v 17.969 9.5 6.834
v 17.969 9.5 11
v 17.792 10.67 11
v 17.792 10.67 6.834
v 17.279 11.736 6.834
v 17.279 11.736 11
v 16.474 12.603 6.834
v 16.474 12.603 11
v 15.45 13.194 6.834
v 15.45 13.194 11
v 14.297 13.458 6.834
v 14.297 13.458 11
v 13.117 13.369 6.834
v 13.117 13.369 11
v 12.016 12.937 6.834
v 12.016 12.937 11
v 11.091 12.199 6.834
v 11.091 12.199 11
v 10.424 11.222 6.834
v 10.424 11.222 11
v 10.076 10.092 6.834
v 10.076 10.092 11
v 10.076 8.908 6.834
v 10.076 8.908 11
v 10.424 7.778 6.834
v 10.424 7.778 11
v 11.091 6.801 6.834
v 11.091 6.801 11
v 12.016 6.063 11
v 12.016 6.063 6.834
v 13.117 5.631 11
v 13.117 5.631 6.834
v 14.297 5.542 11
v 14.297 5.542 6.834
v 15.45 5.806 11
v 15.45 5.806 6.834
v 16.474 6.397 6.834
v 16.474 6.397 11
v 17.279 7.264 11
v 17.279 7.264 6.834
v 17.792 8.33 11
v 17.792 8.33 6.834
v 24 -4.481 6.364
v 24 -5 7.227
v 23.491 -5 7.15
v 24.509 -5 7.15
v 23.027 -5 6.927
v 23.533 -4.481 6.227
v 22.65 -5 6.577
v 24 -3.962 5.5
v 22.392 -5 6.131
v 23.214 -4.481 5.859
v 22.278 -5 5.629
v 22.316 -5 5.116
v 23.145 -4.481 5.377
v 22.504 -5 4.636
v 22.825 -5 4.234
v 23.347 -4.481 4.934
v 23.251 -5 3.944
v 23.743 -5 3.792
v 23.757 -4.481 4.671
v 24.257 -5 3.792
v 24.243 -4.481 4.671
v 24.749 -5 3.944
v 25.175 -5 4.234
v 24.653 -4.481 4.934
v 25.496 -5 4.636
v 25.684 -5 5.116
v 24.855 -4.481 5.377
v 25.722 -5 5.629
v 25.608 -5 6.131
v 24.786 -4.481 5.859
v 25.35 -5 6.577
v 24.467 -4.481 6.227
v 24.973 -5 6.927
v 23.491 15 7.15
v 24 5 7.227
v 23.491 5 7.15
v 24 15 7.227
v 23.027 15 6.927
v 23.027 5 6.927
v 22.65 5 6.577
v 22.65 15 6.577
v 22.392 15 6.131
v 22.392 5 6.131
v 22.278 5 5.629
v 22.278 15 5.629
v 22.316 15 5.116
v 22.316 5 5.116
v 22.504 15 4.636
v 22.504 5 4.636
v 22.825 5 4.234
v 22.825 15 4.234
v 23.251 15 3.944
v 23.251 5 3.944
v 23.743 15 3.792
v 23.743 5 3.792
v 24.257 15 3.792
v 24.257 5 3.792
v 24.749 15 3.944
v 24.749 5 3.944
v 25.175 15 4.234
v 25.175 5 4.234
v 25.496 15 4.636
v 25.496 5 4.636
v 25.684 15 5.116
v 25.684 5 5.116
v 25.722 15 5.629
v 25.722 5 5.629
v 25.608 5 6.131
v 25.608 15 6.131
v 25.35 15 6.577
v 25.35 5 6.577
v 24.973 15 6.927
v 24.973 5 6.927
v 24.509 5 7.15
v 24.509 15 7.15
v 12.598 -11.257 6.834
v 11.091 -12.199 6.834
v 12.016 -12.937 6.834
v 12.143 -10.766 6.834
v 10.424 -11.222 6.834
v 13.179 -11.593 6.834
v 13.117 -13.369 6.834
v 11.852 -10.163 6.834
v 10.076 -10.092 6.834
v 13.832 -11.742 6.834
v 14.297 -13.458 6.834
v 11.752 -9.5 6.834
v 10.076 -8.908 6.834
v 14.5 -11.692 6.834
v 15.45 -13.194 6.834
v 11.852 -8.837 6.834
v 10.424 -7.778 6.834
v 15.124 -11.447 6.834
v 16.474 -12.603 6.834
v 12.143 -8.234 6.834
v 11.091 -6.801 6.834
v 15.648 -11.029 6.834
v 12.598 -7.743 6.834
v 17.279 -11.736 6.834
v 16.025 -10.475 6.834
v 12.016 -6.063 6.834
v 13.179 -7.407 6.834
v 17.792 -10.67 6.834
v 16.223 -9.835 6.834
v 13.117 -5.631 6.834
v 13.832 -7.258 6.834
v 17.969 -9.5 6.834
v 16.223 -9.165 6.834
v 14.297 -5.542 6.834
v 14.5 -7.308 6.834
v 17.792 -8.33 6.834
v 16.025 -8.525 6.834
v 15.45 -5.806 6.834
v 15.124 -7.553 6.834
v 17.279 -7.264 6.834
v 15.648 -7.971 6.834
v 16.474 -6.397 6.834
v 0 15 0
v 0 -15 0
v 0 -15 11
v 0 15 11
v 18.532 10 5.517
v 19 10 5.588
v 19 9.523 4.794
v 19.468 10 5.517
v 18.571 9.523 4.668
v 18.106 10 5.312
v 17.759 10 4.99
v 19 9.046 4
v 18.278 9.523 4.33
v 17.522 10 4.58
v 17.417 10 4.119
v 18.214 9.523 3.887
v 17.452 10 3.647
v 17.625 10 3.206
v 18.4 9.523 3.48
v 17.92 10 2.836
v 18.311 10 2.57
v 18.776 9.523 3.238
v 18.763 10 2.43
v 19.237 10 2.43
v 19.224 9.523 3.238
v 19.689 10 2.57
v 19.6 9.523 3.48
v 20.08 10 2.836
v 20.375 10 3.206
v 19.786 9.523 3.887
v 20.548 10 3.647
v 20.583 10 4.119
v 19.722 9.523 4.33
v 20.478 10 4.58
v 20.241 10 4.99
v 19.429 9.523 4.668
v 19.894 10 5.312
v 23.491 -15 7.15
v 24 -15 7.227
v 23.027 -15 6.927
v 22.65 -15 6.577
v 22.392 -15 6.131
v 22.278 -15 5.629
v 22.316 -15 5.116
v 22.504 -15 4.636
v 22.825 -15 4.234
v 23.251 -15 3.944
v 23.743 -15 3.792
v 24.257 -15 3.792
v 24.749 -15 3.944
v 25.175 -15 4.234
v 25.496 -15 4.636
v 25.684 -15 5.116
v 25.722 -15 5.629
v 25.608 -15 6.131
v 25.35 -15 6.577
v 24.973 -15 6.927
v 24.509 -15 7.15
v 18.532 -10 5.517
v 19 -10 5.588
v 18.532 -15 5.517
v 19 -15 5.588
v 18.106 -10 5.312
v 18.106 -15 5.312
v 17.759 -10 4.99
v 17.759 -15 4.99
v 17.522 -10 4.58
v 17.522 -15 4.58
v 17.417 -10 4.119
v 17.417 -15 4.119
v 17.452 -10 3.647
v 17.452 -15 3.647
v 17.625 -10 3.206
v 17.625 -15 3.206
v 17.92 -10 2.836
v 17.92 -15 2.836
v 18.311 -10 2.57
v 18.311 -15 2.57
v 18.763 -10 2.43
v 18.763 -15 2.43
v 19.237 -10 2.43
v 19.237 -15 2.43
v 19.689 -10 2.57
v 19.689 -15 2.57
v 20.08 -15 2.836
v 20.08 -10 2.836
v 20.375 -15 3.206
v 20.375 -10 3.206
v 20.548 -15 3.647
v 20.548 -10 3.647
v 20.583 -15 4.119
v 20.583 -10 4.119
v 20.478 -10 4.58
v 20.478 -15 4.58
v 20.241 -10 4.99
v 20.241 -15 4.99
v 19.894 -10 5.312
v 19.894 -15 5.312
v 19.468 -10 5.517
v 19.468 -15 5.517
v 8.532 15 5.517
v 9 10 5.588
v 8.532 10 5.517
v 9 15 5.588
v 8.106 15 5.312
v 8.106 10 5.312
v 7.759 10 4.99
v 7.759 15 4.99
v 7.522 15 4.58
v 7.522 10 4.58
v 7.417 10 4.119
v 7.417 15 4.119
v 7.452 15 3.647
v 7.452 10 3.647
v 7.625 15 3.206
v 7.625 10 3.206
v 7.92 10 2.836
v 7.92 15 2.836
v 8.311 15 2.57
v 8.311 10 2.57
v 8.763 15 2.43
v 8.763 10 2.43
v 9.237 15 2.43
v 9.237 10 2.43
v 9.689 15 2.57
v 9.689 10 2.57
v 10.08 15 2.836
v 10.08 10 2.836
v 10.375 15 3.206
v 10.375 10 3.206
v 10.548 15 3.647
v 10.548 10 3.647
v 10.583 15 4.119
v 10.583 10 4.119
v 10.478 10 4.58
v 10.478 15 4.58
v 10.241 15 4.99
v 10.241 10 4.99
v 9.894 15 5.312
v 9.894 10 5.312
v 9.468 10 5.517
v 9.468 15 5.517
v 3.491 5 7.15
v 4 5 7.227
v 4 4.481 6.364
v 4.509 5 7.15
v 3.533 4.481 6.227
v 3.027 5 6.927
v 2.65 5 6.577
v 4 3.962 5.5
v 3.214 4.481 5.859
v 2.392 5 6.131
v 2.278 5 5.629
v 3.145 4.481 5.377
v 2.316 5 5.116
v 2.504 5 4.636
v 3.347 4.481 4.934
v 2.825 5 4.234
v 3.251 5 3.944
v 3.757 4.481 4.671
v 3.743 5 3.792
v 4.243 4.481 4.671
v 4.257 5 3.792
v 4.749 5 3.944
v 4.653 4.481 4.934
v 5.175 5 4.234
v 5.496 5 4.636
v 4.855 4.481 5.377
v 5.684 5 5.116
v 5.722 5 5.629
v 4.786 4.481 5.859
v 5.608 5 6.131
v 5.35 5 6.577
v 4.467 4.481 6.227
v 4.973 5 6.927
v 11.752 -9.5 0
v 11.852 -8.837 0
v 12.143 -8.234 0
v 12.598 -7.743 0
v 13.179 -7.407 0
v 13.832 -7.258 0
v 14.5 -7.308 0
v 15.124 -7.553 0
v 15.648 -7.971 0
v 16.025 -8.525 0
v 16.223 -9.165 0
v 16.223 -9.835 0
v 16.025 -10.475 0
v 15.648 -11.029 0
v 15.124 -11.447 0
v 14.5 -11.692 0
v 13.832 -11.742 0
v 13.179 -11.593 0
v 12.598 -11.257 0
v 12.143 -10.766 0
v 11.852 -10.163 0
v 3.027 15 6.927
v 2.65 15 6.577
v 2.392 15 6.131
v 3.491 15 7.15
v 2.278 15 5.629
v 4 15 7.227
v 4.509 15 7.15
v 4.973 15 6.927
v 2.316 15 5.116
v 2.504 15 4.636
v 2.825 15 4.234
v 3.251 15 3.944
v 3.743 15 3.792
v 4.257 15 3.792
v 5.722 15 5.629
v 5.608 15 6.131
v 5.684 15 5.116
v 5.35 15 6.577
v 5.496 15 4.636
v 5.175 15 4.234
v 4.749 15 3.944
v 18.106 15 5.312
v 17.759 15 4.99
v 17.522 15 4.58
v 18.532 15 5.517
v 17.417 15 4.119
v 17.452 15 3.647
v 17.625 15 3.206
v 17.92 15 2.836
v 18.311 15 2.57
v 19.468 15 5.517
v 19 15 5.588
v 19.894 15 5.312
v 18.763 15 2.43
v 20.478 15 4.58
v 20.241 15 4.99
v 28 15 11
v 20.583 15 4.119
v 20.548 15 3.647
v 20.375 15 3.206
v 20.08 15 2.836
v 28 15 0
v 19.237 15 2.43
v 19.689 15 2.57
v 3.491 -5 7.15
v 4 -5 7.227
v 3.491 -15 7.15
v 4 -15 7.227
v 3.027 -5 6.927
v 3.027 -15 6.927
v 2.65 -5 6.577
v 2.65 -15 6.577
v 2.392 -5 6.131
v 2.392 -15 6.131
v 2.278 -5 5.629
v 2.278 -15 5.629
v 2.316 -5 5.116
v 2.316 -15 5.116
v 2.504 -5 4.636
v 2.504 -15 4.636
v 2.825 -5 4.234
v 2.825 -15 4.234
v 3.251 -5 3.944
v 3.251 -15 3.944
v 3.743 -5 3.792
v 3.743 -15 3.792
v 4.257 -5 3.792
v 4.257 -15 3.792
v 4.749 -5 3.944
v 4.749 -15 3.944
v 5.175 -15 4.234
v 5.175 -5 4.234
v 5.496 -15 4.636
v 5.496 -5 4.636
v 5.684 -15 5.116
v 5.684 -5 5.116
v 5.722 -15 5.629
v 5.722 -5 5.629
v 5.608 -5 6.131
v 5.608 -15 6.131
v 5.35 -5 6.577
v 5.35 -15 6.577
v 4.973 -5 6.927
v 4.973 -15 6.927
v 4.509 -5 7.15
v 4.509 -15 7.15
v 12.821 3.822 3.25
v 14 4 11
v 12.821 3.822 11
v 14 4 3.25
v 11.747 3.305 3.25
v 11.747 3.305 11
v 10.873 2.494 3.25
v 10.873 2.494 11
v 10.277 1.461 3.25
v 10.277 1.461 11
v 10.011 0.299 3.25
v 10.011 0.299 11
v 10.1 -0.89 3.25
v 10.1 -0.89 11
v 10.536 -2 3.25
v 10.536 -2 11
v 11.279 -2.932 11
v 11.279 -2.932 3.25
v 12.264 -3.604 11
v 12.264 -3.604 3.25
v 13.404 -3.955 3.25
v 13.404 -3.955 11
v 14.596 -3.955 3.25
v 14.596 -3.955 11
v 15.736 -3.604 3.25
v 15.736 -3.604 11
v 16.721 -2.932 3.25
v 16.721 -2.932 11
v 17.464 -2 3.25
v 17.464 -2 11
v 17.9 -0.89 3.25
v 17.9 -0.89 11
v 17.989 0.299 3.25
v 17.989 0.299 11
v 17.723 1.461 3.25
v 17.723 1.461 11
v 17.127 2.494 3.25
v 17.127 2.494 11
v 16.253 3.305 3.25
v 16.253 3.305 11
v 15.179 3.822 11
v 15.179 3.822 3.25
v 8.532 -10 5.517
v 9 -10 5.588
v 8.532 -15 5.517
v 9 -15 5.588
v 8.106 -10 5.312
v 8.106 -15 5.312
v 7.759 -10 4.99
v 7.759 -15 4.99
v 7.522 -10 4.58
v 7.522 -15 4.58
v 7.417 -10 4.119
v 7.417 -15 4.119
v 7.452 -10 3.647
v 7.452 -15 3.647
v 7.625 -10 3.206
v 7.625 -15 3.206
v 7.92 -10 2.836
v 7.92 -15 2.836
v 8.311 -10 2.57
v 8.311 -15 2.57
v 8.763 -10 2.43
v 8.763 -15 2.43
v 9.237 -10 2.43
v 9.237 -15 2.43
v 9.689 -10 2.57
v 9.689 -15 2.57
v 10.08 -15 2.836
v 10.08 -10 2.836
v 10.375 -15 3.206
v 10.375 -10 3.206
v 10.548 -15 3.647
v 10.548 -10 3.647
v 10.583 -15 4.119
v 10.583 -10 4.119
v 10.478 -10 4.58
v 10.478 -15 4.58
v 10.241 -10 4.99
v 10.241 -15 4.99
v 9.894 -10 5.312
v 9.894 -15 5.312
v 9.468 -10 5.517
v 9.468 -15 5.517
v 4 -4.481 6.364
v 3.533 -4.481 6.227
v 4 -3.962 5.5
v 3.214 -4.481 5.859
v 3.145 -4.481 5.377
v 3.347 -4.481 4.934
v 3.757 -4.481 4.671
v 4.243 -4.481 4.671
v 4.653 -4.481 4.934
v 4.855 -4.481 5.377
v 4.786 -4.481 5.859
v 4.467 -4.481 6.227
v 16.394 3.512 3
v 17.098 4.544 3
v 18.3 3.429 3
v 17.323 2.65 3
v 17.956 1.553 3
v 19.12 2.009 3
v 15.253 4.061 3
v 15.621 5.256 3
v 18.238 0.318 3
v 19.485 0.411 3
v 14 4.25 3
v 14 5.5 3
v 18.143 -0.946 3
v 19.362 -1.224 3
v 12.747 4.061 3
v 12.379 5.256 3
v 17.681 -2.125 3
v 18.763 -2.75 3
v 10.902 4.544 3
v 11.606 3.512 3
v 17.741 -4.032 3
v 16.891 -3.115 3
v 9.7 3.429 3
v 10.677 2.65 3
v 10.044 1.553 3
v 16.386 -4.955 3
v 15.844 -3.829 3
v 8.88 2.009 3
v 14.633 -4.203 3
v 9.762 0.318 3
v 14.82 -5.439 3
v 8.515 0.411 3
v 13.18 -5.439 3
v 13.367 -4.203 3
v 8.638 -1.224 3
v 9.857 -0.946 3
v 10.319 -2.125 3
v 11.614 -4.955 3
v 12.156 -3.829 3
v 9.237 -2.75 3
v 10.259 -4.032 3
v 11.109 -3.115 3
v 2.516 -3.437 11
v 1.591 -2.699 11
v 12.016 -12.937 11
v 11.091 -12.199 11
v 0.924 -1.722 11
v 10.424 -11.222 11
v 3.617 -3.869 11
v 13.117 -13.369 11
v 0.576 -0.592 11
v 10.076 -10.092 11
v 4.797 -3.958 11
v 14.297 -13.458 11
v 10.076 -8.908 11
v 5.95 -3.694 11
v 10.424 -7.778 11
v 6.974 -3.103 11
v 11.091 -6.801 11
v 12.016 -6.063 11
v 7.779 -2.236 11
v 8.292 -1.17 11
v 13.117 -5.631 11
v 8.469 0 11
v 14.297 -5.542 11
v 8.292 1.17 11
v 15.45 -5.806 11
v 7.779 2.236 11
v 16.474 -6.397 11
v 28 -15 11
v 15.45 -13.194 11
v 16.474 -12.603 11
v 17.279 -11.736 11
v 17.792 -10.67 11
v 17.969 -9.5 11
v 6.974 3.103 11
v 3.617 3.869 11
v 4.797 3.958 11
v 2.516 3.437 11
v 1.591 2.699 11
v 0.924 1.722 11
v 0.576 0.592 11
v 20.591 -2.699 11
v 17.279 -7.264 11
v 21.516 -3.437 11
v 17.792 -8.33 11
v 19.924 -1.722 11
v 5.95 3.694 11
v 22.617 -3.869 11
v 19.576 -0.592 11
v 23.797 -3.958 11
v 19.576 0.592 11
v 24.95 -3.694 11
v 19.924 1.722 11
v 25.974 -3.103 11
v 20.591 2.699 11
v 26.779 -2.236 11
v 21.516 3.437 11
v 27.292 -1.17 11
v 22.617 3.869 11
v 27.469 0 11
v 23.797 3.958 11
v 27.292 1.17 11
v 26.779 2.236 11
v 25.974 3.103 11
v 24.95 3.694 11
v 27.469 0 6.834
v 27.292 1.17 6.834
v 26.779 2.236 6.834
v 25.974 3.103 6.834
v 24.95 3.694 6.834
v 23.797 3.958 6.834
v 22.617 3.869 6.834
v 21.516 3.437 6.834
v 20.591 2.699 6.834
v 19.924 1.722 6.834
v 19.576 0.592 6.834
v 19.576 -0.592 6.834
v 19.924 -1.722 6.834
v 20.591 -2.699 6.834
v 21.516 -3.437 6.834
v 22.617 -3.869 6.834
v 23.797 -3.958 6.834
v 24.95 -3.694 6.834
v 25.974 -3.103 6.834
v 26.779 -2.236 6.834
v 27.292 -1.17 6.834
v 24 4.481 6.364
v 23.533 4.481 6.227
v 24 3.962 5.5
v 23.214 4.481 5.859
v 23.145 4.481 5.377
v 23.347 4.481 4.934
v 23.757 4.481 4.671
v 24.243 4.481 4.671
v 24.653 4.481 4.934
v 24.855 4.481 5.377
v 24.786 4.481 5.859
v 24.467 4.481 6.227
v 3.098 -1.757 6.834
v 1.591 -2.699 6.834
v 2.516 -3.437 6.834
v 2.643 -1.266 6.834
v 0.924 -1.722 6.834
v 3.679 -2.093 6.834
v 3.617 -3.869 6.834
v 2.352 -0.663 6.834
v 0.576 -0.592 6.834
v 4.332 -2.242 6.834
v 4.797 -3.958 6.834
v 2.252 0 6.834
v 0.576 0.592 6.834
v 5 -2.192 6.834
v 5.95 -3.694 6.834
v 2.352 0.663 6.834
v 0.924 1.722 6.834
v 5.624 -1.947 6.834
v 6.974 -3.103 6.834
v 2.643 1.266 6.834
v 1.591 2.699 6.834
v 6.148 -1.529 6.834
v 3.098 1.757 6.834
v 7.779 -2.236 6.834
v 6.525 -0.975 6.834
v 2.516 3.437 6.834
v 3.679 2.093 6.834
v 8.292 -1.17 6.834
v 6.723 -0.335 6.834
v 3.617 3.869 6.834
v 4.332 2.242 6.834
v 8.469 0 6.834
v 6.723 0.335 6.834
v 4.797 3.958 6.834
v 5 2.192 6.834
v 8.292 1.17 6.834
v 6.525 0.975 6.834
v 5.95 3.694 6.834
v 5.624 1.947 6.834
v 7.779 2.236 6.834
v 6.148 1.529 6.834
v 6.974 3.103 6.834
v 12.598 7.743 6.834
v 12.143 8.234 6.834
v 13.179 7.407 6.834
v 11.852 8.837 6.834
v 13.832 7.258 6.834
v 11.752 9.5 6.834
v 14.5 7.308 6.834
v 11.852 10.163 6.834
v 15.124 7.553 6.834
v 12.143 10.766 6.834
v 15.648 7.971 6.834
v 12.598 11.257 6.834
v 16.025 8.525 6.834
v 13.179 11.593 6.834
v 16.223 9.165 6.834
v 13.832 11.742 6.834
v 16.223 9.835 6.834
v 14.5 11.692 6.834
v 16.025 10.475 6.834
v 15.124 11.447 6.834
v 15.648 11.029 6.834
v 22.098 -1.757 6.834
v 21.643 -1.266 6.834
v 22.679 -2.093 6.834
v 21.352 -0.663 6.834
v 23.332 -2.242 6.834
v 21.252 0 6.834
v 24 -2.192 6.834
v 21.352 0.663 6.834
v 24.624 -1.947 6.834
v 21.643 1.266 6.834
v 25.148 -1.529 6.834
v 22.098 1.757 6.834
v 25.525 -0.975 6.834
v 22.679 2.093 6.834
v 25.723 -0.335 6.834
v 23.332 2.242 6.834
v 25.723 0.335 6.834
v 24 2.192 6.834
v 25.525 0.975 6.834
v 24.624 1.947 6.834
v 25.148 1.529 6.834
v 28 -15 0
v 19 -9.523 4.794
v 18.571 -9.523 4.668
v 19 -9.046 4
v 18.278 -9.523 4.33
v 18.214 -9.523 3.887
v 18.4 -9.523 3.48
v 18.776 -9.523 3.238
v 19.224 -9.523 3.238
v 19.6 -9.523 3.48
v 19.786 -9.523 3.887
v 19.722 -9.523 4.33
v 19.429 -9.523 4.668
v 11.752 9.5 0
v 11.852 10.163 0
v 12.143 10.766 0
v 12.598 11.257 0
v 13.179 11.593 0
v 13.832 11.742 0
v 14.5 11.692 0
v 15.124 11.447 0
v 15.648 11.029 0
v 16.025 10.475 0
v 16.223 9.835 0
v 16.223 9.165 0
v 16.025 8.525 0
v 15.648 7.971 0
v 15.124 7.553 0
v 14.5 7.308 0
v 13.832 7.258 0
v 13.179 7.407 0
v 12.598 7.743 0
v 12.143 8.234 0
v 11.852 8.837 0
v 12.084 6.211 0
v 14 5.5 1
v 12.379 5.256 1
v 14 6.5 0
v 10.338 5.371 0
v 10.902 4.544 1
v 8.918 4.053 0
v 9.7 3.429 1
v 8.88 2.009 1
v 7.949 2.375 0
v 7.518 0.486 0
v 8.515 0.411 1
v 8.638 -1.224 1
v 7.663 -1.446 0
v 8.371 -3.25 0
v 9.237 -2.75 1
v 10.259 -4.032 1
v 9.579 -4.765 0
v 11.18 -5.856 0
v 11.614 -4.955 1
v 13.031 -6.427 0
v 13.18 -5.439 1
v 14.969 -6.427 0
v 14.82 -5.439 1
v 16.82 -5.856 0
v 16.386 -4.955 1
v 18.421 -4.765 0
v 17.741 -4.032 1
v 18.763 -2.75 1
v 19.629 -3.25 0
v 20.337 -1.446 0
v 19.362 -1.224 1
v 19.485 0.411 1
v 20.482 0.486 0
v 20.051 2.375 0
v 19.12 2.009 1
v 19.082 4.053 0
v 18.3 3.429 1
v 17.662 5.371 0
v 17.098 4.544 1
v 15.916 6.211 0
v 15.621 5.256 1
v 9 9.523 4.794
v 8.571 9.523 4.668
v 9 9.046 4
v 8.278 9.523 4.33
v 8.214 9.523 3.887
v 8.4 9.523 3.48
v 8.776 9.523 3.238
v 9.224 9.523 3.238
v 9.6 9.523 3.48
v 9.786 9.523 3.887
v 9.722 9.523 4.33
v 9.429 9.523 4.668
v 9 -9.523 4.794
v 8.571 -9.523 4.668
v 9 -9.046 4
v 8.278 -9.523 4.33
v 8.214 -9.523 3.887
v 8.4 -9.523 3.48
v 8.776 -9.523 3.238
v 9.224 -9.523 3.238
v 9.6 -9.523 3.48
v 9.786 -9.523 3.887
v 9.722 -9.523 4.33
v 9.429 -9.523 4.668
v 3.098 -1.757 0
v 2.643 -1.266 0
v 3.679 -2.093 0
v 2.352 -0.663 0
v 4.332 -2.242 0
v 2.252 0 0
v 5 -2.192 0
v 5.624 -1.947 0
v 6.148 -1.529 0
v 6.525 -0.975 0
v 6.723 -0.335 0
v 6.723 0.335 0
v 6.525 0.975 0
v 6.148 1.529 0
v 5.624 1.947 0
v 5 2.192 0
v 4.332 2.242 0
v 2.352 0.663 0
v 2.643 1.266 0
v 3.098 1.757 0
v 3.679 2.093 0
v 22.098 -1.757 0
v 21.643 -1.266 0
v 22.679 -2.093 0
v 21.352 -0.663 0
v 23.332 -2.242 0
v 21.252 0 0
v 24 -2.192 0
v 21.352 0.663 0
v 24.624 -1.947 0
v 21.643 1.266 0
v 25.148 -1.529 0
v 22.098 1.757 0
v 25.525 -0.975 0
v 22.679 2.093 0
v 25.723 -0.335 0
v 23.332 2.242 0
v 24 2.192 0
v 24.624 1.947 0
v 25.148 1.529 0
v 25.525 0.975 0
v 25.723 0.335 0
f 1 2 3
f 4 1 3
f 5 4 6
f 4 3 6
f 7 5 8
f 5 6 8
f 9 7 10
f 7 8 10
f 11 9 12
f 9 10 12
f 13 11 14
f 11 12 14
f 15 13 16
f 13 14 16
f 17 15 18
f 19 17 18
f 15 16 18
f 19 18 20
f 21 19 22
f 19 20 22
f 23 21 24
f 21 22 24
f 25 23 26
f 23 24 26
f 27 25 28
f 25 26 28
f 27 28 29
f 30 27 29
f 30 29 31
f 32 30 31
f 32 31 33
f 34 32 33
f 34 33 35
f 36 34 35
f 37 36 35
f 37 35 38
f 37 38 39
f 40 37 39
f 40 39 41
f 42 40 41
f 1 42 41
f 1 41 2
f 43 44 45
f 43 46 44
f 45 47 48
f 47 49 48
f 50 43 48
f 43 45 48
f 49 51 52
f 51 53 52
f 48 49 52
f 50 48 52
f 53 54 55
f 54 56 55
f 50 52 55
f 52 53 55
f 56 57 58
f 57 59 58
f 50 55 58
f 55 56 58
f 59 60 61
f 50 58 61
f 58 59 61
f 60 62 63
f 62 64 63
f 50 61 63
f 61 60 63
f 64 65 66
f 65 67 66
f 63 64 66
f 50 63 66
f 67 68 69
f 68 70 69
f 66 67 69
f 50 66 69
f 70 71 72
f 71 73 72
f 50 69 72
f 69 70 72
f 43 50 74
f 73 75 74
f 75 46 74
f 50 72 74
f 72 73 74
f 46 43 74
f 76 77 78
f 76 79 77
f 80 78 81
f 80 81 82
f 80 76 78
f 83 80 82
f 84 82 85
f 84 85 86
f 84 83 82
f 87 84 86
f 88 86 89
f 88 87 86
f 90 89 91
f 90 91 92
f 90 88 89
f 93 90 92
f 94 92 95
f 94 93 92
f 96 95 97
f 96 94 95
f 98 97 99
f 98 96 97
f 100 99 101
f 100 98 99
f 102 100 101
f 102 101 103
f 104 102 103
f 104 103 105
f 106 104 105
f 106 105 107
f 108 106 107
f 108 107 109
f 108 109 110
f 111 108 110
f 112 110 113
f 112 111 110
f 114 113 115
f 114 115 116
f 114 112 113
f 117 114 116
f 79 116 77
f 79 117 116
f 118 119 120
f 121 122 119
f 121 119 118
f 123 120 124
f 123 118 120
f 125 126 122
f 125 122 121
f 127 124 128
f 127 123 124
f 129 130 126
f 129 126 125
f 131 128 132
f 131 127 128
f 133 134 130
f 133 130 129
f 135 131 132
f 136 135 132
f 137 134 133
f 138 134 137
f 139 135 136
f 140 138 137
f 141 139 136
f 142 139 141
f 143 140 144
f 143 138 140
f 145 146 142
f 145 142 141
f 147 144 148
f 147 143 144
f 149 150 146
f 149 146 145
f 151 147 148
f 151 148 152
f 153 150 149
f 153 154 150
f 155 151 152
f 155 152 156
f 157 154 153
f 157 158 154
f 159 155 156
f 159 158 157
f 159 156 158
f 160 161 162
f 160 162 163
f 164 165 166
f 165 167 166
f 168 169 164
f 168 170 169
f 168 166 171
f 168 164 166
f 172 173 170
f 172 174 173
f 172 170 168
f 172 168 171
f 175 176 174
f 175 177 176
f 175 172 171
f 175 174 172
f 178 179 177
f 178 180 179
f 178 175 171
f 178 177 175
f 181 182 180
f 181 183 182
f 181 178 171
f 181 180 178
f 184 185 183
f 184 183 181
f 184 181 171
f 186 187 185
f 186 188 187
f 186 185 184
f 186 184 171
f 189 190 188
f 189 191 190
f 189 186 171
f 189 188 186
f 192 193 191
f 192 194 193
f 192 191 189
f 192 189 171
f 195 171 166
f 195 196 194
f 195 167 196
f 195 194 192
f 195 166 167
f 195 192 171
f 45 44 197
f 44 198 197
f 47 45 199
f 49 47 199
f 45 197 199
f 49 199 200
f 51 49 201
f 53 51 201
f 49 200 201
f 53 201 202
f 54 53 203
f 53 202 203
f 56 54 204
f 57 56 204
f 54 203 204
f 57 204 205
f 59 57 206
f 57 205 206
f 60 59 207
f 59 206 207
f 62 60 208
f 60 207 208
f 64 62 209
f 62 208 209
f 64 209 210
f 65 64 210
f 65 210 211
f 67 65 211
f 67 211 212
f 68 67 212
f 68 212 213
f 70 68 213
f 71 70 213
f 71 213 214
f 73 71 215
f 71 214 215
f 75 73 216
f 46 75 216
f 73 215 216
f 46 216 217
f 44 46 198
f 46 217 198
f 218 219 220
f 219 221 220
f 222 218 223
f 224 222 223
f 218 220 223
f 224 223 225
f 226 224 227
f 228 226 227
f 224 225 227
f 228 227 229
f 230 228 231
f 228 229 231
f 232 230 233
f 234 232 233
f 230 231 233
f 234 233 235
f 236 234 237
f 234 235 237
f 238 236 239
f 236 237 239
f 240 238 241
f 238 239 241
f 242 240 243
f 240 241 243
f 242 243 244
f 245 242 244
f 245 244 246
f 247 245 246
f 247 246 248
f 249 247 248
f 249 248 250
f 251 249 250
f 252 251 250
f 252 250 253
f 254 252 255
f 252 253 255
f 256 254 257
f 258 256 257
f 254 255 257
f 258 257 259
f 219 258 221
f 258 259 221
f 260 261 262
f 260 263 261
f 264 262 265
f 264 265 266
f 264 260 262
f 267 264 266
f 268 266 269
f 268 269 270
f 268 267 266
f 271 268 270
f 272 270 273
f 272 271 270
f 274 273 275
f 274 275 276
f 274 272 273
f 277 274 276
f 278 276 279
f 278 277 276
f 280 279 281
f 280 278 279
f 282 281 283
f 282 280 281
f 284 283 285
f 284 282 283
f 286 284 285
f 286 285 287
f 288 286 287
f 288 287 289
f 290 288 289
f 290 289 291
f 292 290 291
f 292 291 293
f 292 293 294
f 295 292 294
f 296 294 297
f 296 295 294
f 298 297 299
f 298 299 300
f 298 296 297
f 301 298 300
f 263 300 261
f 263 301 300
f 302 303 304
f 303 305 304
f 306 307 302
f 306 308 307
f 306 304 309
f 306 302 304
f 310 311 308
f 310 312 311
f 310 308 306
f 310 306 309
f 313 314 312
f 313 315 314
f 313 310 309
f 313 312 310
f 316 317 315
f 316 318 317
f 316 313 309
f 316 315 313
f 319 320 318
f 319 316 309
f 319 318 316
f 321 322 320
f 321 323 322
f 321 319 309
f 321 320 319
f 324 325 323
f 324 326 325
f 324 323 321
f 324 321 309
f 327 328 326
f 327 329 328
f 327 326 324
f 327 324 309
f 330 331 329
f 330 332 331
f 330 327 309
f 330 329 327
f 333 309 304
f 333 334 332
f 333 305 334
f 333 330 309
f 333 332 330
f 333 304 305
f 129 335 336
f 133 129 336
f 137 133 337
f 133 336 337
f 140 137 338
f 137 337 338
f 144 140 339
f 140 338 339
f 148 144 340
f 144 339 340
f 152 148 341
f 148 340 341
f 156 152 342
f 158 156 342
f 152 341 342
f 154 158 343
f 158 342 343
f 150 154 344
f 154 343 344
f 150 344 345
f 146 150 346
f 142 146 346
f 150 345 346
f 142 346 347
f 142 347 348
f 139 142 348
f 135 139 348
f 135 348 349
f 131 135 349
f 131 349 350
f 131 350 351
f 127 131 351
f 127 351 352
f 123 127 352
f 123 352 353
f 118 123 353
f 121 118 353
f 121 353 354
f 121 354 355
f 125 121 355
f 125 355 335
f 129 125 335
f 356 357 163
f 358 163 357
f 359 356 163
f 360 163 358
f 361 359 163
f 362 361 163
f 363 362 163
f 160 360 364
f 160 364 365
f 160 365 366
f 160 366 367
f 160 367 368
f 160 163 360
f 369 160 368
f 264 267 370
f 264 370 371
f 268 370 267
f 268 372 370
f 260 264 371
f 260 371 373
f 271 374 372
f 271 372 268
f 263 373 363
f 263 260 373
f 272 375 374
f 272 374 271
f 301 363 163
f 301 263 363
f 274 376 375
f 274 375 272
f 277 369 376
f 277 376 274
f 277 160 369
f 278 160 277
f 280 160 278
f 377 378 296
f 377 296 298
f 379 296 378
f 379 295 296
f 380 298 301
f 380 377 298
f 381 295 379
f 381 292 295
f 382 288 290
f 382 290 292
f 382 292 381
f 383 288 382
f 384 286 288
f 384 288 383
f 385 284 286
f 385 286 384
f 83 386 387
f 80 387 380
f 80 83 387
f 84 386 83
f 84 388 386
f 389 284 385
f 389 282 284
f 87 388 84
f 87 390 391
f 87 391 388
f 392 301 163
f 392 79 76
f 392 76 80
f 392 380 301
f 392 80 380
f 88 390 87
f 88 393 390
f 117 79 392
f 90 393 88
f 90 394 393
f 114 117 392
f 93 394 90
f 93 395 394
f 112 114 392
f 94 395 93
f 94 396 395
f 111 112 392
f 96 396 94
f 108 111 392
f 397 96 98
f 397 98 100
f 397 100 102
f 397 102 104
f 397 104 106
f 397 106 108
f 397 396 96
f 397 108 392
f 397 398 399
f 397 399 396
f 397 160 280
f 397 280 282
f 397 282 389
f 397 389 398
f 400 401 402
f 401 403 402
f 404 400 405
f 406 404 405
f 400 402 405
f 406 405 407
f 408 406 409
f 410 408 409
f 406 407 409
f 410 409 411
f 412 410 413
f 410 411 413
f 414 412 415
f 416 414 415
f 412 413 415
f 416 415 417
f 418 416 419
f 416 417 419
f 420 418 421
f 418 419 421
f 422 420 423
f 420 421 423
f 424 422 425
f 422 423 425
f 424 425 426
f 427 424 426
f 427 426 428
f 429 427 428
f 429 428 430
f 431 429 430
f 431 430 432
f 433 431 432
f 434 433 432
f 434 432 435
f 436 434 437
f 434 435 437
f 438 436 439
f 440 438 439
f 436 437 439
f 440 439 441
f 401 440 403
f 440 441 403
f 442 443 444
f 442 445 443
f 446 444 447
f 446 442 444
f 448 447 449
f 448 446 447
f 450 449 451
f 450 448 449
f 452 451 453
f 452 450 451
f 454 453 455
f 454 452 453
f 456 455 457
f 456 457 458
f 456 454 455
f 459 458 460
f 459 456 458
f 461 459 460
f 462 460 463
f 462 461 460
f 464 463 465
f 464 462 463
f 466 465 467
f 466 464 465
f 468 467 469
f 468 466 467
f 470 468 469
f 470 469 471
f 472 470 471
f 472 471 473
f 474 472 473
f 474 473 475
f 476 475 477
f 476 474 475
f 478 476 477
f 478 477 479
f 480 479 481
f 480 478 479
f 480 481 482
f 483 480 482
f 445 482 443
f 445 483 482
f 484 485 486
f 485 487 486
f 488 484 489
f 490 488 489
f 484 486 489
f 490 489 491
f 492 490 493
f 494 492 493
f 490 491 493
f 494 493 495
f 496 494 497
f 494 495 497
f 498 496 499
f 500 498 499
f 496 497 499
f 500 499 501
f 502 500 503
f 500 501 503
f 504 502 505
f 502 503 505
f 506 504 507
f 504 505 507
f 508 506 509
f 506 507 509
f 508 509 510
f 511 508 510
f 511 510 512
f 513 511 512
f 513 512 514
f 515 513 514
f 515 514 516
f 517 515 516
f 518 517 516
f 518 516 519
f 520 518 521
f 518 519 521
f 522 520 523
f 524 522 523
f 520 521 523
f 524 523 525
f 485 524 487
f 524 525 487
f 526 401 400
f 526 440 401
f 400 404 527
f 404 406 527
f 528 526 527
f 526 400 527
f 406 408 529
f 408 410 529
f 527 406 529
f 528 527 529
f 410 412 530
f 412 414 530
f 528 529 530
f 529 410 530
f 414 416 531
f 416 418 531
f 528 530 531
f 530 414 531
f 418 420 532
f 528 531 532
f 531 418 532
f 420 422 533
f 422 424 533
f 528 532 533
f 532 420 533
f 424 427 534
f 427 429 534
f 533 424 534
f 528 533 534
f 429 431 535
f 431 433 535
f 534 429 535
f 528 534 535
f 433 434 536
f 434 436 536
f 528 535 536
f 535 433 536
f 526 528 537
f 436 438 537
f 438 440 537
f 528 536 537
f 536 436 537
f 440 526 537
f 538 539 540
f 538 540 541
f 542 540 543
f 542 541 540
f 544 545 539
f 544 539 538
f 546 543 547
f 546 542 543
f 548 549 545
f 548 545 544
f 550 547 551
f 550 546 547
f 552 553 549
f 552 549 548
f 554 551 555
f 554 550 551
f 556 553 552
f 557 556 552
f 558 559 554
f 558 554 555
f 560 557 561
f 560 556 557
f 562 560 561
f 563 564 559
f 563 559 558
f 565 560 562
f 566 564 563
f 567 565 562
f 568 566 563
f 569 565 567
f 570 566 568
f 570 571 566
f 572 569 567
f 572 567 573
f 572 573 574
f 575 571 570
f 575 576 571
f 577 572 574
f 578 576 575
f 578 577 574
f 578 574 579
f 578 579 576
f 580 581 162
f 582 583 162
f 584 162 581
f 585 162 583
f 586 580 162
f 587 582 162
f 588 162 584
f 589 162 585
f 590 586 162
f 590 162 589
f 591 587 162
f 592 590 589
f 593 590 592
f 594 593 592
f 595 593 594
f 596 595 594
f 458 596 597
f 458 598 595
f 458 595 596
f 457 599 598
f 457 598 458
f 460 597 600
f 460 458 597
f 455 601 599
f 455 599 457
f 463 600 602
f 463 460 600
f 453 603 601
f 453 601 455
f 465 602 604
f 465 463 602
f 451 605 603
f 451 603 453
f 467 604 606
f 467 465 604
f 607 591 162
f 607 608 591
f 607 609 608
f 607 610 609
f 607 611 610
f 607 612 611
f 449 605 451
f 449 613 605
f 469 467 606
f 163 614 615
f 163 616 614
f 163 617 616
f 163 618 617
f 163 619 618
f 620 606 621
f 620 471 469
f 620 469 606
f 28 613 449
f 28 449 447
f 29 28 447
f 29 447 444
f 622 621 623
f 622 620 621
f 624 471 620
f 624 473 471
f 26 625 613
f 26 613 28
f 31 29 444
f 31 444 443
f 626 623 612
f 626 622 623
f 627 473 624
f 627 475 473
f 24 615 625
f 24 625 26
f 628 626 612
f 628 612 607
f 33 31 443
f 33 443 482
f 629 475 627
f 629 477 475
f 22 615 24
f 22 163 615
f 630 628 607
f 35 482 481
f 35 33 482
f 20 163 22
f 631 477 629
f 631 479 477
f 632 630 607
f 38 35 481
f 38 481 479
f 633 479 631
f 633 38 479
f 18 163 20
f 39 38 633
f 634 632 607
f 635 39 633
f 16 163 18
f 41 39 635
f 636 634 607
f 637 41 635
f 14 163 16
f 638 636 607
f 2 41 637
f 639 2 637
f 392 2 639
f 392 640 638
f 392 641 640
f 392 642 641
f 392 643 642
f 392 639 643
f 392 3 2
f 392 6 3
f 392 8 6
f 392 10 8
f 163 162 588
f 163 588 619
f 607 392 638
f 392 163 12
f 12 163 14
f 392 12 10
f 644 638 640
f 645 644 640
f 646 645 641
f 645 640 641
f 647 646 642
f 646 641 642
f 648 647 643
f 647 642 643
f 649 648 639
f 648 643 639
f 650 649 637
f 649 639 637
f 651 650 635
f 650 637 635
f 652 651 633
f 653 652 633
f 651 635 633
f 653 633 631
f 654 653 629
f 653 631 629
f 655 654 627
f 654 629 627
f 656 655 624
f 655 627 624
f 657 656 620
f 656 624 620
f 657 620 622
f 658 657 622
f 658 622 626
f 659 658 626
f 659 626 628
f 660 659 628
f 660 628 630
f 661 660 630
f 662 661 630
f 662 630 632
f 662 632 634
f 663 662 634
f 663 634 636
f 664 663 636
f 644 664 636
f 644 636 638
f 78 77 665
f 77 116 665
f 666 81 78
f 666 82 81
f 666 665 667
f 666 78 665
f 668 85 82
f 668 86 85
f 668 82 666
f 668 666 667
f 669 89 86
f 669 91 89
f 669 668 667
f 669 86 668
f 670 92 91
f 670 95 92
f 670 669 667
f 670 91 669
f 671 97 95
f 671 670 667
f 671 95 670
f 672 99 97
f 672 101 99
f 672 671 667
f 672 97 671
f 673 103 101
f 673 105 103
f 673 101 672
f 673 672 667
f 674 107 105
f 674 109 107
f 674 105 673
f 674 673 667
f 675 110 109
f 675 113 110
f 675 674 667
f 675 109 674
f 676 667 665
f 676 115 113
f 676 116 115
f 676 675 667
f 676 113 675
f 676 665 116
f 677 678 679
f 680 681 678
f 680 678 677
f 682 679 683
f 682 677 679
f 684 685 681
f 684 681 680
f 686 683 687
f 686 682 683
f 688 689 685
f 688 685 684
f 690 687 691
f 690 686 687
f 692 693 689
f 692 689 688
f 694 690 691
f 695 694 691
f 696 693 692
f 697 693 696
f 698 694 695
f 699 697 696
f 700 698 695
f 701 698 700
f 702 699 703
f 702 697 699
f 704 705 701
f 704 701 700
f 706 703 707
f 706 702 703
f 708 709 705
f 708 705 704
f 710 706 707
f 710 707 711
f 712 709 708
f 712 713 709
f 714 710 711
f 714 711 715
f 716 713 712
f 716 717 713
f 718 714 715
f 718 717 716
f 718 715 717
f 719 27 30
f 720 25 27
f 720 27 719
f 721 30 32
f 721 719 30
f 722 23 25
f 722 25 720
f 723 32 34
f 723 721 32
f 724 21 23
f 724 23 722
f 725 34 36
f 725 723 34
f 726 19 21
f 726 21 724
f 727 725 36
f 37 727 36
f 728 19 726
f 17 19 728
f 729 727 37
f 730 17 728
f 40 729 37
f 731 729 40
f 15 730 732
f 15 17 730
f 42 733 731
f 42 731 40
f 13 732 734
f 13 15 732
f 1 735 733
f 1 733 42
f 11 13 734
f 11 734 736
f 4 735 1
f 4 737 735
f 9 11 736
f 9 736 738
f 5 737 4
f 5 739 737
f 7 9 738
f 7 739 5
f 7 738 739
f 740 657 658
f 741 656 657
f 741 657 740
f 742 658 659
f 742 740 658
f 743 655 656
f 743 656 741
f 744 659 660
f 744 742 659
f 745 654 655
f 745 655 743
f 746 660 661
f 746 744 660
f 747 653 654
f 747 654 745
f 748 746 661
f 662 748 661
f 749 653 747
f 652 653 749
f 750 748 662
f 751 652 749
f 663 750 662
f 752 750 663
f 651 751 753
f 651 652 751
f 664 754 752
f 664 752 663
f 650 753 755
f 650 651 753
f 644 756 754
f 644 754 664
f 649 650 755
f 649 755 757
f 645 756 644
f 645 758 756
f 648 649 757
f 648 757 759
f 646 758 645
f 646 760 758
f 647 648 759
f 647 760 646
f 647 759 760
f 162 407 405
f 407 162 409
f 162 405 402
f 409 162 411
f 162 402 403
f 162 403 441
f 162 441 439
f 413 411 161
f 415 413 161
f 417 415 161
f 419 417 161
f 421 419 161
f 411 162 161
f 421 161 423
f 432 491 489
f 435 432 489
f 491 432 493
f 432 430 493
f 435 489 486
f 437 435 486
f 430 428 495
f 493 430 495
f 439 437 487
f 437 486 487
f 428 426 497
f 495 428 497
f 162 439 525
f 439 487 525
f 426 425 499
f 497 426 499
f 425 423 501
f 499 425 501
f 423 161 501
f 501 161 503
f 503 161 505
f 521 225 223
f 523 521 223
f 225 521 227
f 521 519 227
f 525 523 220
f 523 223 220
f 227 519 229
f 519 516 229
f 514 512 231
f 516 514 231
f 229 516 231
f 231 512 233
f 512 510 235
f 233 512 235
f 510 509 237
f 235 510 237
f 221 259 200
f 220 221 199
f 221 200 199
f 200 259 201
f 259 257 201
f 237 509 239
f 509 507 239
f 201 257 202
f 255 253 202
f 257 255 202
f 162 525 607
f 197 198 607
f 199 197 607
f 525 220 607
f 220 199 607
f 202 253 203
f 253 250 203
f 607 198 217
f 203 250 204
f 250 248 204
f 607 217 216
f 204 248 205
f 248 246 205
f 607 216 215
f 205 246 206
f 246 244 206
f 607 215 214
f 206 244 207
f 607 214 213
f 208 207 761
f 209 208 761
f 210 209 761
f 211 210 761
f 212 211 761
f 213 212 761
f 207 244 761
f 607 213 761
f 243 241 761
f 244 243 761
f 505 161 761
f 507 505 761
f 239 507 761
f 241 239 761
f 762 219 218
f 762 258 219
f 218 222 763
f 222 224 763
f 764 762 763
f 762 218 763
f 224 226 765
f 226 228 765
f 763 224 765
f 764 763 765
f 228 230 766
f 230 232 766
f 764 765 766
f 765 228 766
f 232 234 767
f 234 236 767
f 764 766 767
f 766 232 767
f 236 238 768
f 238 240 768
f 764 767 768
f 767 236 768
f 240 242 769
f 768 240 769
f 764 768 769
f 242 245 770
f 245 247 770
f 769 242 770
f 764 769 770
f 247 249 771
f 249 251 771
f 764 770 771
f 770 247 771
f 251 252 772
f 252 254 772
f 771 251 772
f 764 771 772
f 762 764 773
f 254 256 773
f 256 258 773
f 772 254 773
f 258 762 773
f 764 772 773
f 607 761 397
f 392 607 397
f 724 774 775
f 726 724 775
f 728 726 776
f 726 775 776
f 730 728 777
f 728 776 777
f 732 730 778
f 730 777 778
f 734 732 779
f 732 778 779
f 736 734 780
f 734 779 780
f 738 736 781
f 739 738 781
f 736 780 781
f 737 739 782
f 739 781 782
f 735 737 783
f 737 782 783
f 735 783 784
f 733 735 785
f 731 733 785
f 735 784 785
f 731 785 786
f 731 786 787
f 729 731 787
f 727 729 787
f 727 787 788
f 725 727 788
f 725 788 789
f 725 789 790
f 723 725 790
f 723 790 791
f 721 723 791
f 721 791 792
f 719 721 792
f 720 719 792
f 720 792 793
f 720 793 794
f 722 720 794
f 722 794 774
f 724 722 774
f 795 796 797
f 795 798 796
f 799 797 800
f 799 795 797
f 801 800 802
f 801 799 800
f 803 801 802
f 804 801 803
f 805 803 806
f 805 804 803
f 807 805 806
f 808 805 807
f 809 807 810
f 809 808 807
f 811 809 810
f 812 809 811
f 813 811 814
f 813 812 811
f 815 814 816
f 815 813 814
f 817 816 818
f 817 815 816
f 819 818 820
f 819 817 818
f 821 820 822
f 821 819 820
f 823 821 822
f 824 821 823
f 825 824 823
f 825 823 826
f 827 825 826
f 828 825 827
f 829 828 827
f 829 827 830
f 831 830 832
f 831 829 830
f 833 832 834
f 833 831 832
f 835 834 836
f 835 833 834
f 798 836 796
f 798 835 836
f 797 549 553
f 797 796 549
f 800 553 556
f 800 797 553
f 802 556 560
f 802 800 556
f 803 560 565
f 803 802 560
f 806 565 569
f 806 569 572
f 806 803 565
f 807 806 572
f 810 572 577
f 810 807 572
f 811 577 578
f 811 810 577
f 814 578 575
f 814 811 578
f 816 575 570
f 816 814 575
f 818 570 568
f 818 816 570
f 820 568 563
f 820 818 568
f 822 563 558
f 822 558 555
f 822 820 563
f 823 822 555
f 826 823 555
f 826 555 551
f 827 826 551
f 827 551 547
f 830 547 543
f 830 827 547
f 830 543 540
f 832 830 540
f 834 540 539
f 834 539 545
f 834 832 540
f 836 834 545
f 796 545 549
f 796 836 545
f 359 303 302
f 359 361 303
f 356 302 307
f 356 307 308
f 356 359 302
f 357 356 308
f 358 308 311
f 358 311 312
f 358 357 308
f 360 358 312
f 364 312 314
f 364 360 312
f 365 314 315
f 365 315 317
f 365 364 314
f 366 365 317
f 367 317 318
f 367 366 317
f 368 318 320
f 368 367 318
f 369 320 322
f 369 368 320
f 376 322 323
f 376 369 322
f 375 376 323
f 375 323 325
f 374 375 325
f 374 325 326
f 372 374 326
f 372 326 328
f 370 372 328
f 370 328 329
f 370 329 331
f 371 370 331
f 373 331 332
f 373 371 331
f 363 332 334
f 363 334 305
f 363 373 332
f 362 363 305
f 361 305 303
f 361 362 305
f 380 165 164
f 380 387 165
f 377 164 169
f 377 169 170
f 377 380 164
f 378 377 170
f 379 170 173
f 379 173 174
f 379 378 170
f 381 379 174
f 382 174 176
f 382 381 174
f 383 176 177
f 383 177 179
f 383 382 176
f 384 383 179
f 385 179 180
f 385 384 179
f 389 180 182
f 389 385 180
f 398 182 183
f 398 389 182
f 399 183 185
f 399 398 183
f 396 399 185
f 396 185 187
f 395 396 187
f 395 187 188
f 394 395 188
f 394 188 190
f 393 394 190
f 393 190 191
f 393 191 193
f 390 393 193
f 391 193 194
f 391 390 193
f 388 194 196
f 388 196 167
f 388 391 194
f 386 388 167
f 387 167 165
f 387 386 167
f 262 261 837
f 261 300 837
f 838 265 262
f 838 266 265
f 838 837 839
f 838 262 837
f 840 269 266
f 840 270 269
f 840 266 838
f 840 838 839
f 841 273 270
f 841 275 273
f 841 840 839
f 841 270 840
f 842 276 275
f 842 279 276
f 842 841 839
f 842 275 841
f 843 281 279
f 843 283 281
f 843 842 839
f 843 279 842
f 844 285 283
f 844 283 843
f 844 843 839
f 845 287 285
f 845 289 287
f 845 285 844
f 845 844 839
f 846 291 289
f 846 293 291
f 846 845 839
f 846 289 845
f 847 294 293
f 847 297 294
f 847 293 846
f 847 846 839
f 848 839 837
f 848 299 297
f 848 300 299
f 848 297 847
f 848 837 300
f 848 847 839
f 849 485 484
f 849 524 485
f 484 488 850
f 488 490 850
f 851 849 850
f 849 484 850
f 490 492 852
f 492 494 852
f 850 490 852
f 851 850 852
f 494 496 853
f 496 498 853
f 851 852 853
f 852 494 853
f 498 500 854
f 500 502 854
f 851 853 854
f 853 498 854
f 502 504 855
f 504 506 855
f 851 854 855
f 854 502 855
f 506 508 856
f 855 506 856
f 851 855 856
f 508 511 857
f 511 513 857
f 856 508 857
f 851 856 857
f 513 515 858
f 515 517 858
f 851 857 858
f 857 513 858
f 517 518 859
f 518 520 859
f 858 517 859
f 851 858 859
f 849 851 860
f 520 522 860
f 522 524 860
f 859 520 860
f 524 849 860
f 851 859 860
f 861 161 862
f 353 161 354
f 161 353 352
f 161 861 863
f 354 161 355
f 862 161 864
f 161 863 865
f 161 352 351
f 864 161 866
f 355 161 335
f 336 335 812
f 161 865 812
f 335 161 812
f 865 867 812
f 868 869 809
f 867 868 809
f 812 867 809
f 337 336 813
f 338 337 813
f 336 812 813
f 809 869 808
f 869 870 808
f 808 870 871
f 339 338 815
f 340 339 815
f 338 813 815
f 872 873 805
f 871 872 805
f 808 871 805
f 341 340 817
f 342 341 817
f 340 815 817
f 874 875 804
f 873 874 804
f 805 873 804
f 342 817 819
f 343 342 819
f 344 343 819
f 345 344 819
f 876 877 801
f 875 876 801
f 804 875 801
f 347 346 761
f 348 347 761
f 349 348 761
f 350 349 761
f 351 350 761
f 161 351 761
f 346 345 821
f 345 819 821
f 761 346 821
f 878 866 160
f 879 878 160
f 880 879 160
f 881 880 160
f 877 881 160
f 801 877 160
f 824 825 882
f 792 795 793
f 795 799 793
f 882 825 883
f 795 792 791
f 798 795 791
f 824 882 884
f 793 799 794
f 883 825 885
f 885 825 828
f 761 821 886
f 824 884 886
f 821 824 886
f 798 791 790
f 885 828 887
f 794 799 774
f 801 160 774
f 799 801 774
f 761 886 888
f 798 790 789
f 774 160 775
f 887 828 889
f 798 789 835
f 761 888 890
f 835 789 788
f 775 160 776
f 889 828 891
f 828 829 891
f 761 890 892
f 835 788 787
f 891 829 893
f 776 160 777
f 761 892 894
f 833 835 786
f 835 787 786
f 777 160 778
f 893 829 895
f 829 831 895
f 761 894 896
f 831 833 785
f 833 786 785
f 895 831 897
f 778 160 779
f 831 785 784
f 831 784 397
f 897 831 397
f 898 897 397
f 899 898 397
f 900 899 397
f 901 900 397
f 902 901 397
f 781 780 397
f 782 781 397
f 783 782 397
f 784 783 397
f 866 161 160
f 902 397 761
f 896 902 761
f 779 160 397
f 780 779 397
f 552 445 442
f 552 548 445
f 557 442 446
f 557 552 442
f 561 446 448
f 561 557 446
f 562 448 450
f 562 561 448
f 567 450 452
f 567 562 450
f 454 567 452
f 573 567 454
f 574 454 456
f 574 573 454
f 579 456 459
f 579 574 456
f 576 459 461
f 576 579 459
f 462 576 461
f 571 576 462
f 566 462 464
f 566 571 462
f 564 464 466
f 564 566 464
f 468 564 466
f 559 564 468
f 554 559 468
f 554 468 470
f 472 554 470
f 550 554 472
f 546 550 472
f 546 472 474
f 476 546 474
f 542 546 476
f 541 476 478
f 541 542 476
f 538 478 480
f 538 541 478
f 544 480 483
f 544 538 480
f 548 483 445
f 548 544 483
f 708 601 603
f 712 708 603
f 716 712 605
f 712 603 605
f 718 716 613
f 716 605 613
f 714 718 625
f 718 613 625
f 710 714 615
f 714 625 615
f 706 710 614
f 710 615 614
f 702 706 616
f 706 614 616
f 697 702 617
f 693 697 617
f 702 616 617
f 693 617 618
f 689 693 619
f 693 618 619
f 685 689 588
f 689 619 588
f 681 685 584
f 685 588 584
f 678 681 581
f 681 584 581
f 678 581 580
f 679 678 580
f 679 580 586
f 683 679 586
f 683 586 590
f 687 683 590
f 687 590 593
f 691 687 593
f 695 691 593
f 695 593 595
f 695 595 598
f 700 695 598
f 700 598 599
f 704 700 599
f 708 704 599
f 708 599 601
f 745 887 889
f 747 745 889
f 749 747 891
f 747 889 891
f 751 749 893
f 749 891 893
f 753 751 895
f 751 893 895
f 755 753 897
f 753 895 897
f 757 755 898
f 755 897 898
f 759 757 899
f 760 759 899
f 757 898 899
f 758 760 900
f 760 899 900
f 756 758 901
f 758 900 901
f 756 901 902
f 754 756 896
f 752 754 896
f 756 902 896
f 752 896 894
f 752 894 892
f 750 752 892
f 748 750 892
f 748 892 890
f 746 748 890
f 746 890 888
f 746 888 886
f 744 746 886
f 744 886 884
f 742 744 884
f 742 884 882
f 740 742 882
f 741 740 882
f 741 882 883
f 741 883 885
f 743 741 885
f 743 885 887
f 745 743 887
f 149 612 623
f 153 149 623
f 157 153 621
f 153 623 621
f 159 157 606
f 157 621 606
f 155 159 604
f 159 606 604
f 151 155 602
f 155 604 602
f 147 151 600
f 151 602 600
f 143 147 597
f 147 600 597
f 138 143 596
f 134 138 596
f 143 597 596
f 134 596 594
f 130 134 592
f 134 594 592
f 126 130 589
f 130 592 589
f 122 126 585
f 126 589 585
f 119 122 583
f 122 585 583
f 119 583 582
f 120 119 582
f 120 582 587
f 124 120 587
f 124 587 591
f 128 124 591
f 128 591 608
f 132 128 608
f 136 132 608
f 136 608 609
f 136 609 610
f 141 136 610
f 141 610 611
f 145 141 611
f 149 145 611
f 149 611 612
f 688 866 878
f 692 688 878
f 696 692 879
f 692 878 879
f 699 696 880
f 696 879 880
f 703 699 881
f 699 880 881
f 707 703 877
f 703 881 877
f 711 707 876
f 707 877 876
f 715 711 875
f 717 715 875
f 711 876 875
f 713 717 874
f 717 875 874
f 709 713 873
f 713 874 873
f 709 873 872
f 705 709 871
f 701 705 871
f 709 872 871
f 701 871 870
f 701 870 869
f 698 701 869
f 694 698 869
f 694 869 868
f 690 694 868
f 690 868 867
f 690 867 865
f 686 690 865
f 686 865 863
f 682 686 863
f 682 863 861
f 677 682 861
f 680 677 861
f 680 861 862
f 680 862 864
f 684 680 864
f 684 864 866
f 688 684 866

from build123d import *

# Parameters (mm, degrees)
SKETCH1_W                                      = 28
SKETCH1_H                                      = 30
BOSS_EXTRUDE1_DEPTH                            = 11
CBORE_FOR_8_SOCKET_HEAD_CAP_SCREW3_D           = 4.4958
CBORE_FOR_8_SOCKET_HEAD_CAP_SCREW3_DEPTH       = 11
CBORE_FOR_8_SOCKET_HEAD_CAP_SCREW3_CBORE_D     = 7.9375
CBORE_FOR_8_SOCKET_HEAD_CAP_SCREW3_CBORE_DEPTH = 4.1656
F_8_32_TAPPED_HOLE1_AT_2_COUNT                 = 2
F_8_32_TAPPED_HOLE1_AT_2_PITCH                 = 20
F_1_8_0_1250_DOWEL_HOLE1_AT_2_COUNT            = 2
F_1_8_0_1250_DOWEL_HOLE1_AT_2_PITCH            = 10


with BuildPart() as part:
    # Sketch1 → Boss-Extrude1 (new body)
    with BuildSketch(Plane.XY):
        with Locations((14, 0)):
            Rectangle(SKETCH1_W, SKETCH1_H)
    extrude(amount=BOSS_EXTRUDE1_DEPTH)

    # Sketch16 → CBORE for M5 Hex Head Bolt1 (revolve, cut)
    with BuildSketch(Plane.YZ.offset(14)):
        Polygon((0, 0), (0, 11), (4, 11), (4, 3.25), (4.25, 3), (5.5, 3), (5.5, 1), (6.5, 0), align=None)
    revolve(axis=Axis((14, 0, -6.35), (0, 0, 1)), mode=Mode.SUBTRACT)

    # CBORE for #8 Socket Head Cap Screw3
    with Locations(Plane.XY.offset(11)):
        with Locations((23.5, 0), (4.5, 0), (14, 9.5), (14, -9.5)):
            CounterBoreHole(CBORE_FOR_8_SOCKET_HEAD_CAP_SCREW3_D / 2, CBORE_FOR_8_SOCKET_HEAD_CAP_SCREW3_CBORE_D / 2, CBORE_FOR_8_SOCKET_HEAD_CAP_SCREW3_CBORE_DEPTH, depth=CBORE_FOR_8_SOCKET_HEAD_CAP_SCREW3_DEPTH)

    # Sketch13 → #8-32 Tapped Hole1 (revolve, cut)
    with BuildSketch(Plane(origin=(4, 15, 5.5), x_dir=(0, 0, 1), z_dir=(1, 0, 0))):
        Polygon((0, 0), (0, 11.037806461), (1.7272, 10), (1.7272, 0), align=None)
    f_8_32_tapped_hole1 = revolve(axis=Axis((4, 21.35, 5.5), (0, -1, 0)), mode=Mode.SUBTRACT)

    # #8-32 Tapped Hole1 at 2: #8-32 Tapped Hole1 ×2
    with Locations(*[(i * F_8_32_TAPPED_HOLE1_AT_2_PITCH, 0, 0) for i in range(1, F_8_32_TAPPED_HOLE1_AT_2_COUNT)]):
        add(f_8_32_tapped_hole1, mode=Mode.SUBTRACT)

    # Sketch20 → 1/8 (0.1250) Dowel Hole1 (revolve, cut)
    with BuildSketch(Plane(origin=(9, 15, 4), x_dir=(0, 0, 1), z_dir=(1, 0, 0))):
        Polygon((0, 0), (0, 5.953866233), (1.5875, 5), (1.5875, 0), align=None)
    f_1_8_0_1250_dowel_hole1 = revolve(axis=Axis((9, 21.35, 4), (0, -1, 0)), mode=Mode.SUBTRACT)

    # 1/8 (0.1250) Dowel Hole1 at 2: 1/8 (0.1250) Dowel Hole1 ×2
    with Locations(*[(i * F_1_8_0_1250_DOWEL_HOLE1_AT_2_PITCH, 0, 0) for i in range(1, F_1_8_0_1250_DOWEL_HOLE1_AT_2_COUNT)]):
        add(f_1_8_0_1250_dowel_hole1, mode=Mode.SUBTRACT)

    # Mirror1: 1/8 (0.1250) Dowel Hole1, #8-32 Tapped Hole1 across plane
    add(f_1_8_0_1250_dowel_hole1.mirror(Plane.ZX), mode=Mode.SUBTRACT)
    add(f_8_32_tapped_hole1.mirror(Plane.ZX), mode=Mode.SUBTRACT)

    # Mirror1 copy 1 sketch → Mirror1 copy 1 (revolve, cut)
    with BuildSketch(Plane(origin=(19, -15, 4), x_dir=(0, 0, 1), z_dir=(1, 0, 0))):
        Polygon((0, 0), (0, -5.953866233), (1.5875, -5), (1.5875, 0), align=None)
    revolve(axis=Axis((19, -21.35, 4), (0, -1, 0)), mode=Mode.SUBTRACT)

    # Mirror1 copy 2 sketch → Mirror1 copy 2 (revolve, cut)
    with BuildSketch(Plane(origin=(24, -15, 5.5), x_dir=(0, 0, 1), z_dir=(1, 0, 0))):
        Polygon((0, 0), (0, -11.037806461), (1.7272, -10), (1.7272, 0), align=None)
    revolve(axis=Axis((24, -21.35, 5.5), (0, -1, 0)), mode=Mode.SUBTRACT)


solid = part.part
